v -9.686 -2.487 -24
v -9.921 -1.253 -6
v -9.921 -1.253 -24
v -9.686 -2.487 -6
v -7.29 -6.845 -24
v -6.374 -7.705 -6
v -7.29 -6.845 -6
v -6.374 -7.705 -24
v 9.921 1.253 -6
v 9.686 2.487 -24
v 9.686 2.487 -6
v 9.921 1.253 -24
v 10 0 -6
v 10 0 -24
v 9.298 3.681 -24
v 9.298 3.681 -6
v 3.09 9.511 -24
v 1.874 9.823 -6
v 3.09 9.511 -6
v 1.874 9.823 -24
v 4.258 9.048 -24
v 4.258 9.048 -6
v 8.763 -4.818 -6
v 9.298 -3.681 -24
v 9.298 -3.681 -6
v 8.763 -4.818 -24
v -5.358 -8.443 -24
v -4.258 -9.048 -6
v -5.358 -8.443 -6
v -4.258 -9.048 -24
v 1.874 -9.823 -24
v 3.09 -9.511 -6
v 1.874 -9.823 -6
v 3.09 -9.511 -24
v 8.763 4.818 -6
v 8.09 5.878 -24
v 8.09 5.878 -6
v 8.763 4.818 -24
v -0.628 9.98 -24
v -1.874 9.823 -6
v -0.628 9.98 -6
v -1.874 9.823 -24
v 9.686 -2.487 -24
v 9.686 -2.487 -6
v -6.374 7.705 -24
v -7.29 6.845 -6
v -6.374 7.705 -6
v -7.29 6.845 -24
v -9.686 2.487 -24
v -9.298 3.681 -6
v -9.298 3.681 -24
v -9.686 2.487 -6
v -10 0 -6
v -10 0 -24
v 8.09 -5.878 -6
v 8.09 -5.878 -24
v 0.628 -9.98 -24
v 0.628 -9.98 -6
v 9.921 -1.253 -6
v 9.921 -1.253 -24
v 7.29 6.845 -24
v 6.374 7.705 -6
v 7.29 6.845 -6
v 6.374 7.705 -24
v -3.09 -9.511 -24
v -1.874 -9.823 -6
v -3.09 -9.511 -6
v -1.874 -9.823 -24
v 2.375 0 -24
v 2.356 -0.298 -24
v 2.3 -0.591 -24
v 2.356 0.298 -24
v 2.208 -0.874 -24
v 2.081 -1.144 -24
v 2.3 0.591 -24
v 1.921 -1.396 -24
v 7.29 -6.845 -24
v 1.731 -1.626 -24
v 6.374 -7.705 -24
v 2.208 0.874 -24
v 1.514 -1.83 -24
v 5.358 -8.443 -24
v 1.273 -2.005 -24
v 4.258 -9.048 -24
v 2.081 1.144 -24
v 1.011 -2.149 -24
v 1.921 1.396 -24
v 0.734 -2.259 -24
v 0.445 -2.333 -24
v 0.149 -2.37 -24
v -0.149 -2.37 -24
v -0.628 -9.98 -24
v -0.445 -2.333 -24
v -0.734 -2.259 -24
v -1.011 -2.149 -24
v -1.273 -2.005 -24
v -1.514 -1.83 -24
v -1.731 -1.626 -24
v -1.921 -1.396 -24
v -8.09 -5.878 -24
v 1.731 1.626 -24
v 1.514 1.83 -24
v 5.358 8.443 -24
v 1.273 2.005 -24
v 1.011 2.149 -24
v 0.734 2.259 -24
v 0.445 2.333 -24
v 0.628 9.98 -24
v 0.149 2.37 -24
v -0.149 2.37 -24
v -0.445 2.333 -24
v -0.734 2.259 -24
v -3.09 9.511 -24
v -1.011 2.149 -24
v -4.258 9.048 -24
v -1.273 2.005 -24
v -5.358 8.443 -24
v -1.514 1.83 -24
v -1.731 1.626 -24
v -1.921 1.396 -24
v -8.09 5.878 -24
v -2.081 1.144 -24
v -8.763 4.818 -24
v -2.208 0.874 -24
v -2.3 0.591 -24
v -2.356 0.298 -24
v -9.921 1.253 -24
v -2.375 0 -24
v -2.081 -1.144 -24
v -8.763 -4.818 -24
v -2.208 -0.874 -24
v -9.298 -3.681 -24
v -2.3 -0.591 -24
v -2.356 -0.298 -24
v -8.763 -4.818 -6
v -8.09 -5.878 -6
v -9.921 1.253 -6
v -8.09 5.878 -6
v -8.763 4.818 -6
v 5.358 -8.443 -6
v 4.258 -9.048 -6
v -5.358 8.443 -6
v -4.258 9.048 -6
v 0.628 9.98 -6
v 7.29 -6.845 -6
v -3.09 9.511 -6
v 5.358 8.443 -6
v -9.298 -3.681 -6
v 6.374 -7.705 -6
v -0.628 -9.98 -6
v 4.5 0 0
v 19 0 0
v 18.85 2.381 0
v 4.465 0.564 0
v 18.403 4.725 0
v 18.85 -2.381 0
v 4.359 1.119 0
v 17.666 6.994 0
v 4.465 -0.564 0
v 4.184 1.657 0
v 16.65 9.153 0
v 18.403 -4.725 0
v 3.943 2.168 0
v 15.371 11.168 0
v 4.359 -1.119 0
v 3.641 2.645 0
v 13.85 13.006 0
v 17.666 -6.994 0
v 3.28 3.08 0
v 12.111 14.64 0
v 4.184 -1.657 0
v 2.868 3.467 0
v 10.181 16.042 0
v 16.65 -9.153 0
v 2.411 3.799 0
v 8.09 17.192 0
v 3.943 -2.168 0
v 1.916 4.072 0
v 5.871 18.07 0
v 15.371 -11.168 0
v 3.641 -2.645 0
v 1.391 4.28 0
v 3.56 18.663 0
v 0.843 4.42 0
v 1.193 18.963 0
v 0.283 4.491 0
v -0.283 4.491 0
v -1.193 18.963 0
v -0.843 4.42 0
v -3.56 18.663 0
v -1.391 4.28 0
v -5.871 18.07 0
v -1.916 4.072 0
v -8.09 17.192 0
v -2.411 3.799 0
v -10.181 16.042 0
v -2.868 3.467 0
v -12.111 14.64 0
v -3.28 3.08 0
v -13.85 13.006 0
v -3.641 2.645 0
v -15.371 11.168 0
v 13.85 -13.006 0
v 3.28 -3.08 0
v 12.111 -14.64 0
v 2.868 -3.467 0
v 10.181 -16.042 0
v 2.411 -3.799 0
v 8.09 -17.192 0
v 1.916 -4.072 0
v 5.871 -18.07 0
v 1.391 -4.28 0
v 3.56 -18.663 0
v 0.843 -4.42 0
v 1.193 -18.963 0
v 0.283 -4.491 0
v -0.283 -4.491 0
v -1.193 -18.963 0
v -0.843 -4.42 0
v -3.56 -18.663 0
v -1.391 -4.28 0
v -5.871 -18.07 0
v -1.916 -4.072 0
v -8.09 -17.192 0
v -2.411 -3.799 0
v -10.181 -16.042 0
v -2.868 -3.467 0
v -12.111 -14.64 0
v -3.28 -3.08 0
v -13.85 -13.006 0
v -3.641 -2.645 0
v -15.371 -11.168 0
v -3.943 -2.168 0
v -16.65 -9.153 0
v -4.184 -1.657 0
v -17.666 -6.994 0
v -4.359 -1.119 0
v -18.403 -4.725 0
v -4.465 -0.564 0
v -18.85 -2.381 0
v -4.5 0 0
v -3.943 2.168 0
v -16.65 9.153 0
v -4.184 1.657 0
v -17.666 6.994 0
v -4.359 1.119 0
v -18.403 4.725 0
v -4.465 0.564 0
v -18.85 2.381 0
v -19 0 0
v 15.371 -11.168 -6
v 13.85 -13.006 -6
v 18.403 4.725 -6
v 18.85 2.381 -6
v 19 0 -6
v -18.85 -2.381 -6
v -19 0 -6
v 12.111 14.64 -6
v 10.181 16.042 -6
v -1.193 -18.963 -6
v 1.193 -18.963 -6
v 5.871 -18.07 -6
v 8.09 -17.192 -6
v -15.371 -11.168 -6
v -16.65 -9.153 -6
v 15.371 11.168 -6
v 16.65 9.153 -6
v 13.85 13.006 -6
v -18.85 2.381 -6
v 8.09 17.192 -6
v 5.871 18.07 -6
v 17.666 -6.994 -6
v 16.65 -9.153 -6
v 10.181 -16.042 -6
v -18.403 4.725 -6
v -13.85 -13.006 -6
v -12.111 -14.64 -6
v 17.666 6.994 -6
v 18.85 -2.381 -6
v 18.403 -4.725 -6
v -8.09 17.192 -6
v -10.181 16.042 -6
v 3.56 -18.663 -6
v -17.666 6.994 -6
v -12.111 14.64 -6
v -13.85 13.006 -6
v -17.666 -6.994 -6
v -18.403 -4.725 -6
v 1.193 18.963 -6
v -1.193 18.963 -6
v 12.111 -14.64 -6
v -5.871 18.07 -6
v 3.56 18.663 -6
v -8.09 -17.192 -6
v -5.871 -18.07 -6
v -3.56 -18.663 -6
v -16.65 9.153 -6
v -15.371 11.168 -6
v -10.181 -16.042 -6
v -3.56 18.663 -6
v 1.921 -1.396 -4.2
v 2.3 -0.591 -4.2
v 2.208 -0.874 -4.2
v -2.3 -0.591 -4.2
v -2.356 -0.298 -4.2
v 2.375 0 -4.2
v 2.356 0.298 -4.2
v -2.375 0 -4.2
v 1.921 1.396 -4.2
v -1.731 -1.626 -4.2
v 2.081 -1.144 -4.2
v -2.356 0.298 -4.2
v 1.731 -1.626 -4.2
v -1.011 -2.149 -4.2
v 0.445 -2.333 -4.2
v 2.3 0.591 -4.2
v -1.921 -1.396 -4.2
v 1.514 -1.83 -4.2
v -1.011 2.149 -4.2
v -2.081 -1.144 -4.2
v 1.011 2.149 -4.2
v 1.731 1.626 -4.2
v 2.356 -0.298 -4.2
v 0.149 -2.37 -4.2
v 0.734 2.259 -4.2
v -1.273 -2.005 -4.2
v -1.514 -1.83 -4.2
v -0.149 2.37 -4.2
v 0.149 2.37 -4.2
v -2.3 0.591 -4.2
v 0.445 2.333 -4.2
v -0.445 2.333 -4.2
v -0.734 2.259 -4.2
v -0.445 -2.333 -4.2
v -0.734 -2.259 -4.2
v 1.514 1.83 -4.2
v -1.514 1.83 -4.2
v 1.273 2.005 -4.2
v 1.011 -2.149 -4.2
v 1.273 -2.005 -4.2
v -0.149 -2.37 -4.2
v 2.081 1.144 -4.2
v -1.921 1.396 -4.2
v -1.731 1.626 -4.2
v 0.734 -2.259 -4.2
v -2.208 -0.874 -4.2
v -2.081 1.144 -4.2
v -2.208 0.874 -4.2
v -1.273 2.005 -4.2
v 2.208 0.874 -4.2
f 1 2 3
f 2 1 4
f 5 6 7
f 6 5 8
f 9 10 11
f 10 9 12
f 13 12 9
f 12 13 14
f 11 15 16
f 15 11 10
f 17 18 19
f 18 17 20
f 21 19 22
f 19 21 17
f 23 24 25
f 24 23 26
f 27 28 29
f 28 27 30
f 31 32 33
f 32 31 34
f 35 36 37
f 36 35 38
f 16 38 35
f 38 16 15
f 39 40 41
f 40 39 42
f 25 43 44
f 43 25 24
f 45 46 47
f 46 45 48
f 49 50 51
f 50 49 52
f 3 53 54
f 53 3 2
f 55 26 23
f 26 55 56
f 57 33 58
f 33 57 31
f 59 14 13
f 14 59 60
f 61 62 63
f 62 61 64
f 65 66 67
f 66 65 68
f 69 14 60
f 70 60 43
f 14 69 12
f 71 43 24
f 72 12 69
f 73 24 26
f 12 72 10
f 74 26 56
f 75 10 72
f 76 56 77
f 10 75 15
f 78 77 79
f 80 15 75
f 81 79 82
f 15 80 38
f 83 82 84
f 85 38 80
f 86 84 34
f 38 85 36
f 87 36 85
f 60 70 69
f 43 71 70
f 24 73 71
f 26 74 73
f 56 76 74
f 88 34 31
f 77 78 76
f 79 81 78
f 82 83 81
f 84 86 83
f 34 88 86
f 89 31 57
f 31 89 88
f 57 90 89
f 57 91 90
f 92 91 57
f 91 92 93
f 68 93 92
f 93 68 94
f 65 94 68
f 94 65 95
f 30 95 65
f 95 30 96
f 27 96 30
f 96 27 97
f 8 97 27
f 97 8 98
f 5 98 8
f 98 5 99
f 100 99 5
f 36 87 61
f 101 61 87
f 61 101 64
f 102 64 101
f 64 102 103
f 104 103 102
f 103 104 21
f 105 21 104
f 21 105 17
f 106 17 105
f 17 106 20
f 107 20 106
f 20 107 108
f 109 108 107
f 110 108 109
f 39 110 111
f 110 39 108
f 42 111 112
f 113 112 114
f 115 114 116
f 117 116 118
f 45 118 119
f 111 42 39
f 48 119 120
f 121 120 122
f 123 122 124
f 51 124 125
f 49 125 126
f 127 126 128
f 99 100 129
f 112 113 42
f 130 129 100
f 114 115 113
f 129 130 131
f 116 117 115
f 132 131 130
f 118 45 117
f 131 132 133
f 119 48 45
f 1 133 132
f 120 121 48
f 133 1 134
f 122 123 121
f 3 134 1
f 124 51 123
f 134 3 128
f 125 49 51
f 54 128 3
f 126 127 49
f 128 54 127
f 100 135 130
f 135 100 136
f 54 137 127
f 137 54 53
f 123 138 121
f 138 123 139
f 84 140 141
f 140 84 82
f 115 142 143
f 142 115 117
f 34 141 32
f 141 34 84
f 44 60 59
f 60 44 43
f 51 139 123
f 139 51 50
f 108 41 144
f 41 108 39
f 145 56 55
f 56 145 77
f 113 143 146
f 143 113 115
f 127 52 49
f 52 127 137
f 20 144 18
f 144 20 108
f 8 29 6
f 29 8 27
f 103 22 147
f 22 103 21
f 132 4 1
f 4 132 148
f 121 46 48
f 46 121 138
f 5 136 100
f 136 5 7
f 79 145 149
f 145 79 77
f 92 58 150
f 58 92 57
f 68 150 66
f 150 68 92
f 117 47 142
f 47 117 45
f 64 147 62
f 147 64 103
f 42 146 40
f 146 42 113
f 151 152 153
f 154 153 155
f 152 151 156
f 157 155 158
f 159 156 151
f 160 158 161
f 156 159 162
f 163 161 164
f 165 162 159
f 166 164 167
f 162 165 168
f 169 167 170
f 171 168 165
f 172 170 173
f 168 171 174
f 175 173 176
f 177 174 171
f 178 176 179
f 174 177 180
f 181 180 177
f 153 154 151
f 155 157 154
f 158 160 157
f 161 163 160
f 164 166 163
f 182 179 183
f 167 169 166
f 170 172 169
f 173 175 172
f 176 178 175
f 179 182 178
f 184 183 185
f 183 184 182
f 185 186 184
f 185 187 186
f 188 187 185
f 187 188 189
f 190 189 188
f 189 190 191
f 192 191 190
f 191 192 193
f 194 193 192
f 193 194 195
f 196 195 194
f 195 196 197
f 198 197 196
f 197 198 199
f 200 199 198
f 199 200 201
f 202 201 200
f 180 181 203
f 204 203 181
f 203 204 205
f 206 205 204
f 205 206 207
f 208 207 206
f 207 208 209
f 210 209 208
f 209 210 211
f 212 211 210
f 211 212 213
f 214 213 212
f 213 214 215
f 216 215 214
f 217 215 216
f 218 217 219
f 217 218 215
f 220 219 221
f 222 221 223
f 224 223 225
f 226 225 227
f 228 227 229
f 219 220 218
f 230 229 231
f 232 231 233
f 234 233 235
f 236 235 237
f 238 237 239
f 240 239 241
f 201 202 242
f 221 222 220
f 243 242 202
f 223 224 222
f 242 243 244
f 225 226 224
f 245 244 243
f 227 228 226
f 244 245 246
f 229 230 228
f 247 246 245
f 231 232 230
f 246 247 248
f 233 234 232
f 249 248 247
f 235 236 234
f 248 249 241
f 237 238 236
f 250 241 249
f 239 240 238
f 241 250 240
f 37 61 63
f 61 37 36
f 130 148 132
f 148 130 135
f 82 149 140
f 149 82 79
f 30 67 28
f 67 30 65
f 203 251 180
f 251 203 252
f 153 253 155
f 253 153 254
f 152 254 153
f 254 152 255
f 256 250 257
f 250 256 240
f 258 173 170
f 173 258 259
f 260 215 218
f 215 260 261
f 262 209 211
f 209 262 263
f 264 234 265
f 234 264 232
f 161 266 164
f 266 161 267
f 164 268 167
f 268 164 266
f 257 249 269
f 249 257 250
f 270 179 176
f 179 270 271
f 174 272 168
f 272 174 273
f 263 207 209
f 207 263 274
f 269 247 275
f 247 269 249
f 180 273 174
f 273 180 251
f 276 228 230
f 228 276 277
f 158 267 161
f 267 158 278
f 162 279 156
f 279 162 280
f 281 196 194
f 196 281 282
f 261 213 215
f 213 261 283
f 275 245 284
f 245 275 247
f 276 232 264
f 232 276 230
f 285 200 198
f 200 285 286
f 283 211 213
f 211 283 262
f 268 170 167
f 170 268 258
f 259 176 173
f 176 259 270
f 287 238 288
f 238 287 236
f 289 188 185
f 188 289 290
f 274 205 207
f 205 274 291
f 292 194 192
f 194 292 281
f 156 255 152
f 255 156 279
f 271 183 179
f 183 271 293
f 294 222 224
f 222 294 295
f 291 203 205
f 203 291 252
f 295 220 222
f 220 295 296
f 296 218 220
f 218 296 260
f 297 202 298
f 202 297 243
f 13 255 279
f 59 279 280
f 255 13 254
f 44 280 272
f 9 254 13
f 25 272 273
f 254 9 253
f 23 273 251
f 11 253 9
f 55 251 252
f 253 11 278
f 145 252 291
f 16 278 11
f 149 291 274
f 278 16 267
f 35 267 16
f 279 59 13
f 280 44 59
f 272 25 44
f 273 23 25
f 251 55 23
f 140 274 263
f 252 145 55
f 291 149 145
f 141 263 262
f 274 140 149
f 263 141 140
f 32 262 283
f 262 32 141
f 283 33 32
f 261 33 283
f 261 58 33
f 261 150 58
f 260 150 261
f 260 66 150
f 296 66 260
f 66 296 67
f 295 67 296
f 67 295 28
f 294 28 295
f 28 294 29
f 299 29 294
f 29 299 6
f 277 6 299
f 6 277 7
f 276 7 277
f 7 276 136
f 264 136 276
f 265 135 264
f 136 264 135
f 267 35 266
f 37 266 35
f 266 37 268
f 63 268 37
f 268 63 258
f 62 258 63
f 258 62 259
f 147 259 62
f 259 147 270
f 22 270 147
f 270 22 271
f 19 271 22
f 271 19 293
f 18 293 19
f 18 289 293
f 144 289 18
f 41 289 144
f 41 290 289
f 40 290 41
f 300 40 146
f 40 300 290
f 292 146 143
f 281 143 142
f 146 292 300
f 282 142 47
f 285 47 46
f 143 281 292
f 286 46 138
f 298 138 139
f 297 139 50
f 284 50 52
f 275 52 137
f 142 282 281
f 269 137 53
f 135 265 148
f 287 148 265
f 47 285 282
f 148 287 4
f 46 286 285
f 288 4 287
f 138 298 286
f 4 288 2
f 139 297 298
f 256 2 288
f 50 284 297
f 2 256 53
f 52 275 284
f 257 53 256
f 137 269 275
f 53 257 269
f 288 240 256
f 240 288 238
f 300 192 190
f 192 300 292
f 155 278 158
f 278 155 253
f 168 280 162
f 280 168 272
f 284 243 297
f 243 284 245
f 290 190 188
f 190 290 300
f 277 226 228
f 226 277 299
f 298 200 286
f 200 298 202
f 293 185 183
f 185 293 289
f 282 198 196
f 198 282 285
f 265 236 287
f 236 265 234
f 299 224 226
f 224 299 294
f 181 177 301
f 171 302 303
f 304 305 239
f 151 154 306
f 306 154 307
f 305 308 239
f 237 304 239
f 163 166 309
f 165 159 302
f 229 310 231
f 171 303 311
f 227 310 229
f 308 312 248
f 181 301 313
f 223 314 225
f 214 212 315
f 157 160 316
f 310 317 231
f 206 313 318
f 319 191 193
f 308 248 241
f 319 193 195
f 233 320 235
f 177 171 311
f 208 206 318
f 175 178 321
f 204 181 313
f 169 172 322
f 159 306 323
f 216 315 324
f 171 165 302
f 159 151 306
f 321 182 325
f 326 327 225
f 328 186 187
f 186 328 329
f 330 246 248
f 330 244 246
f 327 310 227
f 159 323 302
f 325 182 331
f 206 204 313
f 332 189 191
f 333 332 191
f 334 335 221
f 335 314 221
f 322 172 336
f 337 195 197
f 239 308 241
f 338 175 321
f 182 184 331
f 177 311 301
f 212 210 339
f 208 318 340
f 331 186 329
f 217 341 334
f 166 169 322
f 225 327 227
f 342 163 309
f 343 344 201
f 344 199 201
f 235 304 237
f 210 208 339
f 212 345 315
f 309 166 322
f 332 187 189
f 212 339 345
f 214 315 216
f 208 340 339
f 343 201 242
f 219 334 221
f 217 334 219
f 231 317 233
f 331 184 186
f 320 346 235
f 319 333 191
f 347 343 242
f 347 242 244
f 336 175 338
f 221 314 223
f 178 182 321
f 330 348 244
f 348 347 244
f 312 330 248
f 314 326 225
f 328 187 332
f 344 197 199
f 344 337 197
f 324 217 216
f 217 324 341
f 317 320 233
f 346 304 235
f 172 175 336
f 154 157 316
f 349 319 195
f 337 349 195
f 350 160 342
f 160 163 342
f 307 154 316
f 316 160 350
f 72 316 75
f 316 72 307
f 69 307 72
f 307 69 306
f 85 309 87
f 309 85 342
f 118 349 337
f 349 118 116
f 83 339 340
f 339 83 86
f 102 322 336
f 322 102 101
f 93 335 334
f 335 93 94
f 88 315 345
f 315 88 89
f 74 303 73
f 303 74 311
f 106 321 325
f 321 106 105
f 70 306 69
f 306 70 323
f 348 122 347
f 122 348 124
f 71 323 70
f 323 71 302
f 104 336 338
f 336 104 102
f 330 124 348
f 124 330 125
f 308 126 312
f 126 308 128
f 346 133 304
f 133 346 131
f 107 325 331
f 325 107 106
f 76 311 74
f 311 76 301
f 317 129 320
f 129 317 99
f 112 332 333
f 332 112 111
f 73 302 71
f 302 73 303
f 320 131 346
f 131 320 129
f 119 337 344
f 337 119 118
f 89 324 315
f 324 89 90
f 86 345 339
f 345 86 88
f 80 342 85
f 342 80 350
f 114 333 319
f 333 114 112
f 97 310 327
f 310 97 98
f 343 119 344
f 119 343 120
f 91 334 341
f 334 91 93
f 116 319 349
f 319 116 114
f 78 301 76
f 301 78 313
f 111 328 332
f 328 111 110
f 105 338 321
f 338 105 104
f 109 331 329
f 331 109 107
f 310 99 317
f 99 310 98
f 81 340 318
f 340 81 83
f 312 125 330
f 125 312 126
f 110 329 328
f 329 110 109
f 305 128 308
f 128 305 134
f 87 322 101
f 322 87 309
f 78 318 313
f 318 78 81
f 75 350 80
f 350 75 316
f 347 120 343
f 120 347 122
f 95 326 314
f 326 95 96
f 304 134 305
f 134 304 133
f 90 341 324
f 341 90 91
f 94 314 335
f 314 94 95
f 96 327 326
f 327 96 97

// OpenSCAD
$fn = 50;


difference() {
	union() {
		translate(v = [0, 0, -24.0000000000]) {
			cylinder(h = 24, r = 10.0000000000);
		}
		translate(v = [0, 0, -6.0000000000]) {
			cylinder(h = 6, r = 19.0000000000);
		}
	}
	union() {
		translate(v = [0, 0, 0]) {
			rotate(a = [0, 0, 0]) {
				difference() {
					union() {
						#translate(v = [0, 0, -24.0000000000]) {
							cylinder(h = 24, r = 2.2500000000);
						}
						#translate(v = [0, 0, -4.2000000000]) {
							cylinder(h = 4.2000000000, r = 10.0000000000, r1 = 2.3750000000, r2 = 4.5000000000);
						}
						#translate(v = [0, 0, -24.0000000000]) {
							cylinder(h = 24, r = 2.3750000000);
						}
						#translate(v = [0, 0, -24.0000000000]) {
							cylinder(h = 24, r = 2.2500000000);
						}
					}
					union();
				}
			}
		}
	}
}
